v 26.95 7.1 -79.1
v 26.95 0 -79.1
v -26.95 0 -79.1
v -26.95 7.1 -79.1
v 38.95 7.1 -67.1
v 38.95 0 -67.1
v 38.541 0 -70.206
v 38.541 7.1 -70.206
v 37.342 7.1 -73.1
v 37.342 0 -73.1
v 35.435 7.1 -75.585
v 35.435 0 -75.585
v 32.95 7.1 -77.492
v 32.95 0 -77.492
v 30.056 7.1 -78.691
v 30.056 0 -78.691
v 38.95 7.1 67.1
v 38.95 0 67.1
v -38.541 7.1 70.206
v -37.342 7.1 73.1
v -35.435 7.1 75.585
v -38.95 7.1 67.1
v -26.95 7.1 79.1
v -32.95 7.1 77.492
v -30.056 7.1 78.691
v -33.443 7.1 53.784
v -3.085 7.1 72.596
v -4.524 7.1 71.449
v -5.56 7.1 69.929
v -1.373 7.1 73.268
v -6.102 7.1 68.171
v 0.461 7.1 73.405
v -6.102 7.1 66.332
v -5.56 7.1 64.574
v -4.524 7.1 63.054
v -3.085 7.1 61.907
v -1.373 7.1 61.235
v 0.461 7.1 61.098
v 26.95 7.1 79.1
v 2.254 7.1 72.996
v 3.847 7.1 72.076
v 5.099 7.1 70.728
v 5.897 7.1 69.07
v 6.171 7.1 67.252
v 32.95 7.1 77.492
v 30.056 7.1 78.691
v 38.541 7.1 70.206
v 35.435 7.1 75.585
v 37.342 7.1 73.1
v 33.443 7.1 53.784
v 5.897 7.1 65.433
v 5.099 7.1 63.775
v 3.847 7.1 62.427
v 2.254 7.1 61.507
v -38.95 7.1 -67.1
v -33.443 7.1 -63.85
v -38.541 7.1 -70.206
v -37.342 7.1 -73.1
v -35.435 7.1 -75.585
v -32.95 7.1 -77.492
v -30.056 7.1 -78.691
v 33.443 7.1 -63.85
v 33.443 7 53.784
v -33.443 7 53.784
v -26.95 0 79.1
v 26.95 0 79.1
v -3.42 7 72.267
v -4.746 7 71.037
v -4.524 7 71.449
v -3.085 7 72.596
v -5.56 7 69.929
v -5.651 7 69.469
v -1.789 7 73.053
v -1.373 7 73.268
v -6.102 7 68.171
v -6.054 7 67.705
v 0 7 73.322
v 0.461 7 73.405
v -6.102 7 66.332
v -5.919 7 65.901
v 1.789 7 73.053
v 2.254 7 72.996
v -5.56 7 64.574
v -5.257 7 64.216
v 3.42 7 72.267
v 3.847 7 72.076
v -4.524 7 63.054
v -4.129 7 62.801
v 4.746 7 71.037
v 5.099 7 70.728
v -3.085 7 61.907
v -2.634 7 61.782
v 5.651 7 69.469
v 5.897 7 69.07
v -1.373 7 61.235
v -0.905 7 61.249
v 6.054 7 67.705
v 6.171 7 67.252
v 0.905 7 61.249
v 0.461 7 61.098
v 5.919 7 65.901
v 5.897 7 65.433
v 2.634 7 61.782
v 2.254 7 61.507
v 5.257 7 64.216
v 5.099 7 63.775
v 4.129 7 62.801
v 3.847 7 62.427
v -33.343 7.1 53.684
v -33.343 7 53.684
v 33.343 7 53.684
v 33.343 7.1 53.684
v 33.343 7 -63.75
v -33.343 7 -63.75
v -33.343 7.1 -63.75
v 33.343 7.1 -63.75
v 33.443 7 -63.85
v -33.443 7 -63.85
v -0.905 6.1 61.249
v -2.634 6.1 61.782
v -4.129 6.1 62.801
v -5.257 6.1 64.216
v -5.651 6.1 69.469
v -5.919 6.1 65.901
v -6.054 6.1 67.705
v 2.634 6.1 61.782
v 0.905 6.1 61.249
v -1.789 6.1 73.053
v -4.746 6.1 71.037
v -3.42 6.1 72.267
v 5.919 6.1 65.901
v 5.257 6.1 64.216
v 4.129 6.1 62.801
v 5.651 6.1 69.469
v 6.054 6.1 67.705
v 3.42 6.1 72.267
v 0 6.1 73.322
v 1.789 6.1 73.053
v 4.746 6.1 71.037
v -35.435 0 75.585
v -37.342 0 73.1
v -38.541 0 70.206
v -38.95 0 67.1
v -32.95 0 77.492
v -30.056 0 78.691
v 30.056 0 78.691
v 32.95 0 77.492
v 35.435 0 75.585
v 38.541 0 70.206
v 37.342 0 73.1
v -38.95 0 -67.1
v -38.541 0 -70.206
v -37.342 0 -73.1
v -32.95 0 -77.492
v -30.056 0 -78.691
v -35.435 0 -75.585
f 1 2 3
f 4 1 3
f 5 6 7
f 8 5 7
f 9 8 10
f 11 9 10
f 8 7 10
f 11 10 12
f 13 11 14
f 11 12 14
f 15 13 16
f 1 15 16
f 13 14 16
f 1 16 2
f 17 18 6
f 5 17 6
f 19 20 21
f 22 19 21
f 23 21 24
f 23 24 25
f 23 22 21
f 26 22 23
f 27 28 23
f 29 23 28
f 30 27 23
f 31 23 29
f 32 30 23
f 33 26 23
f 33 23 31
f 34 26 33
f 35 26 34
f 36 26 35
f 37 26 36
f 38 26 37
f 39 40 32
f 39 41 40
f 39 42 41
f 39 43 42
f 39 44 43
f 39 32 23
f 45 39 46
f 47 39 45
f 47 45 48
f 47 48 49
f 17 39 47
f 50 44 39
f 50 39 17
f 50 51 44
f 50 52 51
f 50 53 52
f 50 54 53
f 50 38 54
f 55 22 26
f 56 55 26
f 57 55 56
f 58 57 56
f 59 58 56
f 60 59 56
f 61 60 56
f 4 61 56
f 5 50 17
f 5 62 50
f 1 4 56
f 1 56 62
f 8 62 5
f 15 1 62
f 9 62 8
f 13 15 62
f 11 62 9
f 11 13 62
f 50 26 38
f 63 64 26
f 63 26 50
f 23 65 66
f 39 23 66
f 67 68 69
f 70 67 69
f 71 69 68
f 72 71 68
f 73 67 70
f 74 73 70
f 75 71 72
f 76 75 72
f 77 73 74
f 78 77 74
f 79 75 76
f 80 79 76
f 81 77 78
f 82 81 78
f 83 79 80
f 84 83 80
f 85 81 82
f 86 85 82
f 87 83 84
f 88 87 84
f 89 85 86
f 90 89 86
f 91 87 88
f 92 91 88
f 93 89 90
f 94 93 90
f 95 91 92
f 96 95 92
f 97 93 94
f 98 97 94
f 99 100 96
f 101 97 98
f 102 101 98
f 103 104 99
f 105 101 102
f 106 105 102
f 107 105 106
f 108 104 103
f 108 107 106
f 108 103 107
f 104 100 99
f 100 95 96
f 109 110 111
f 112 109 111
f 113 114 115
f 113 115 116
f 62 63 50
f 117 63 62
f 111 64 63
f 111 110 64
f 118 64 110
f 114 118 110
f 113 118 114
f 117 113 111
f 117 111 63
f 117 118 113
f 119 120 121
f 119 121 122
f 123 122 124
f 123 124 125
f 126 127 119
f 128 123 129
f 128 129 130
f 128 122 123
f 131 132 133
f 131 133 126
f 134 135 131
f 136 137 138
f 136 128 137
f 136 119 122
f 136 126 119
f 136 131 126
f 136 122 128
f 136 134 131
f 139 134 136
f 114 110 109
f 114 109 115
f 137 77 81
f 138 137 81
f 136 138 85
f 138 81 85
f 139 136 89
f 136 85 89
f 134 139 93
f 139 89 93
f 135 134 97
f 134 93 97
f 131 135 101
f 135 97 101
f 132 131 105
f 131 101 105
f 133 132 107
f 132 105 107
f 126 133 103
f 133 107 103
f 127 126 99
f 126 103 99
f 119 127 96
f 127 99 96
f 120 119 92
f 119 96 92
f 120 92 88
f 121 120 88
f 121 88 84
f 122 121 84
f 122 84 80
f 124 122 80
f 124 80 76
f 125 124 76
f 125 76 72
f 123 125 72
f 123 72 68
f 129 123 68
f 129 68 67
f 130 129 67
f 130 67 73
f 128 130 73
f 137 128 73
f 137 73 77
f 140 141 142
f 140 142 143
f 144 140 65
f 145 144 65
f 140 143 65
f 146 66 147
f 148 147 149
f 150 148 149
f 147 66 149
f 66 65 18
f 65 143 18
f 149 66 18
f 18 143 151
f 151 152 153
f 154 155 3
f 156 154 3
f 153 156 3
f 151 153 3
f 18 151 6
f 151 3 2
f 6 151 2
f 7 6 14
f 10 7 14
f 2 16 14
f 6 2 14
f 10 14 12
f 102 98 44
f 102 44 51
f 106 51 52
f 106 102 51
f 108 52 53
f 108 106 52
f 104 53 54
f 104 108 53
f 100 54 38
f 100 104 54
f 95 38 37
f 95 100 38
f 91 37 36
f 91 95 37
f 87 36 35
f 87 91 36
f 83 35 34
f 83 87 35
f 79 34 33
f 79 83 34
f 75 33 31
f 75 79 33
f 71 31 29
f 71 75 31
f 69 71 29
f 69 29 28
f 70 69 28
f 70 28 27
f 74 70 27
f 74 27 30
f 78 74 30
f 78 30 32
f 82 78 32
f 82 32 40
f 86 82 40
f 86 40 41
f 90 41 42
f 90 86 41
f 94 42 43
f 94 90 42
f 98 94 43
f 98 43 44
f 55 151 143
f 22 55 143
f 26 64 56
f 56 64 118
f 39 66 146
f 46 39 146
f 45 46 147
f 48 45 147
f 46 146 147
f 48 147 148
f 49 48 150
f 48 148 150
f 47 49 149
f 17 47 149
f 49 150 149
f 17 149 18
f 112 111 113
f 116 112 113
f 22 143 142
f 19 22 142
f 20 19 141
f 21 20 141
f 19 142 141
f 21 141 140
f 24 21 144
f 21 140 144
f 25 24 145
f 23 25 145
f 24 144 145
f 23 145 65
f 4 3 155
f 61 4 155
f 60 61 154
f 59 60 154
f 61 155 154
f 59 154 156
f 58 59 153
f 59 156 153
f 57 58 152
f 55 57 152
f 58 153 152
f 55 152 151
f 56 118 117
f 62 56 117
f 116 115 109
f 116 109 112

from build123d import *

# Parameters (mm, degrees)
EXTRUDE_1_DEPTH       = 7.1
SKETCH_2_R            = 6.07081667
CUT_EXTRUDE_1_DEPTH   = 1
SKETCH_2_4_R          = 6.17081667
SKETCH_2_4_R_2        = 6.07081667
SKETCH_2_4_W          = 66.885632048
SKETCH_2_4_H          = 117.633817445
SKETCH_2_4_W_2        = 66.685632048
SKETCH_2_4_H_2        = 117.433817445
CUT_EXTRUDE_1_2_DEPTH = 0.1


with BuildPart() as part:
    # Эскиз1 → Бобышка-Вытянуть1 (new body)
    with BuildSketch(Plane(origin=(0, 0, 0), x_dir=(1, 0, 0), z_dir=(0, 1, 0))):
        with BuildLine():
            Line((26.95, 79.1), (-26.95, 79.1))
            ThreePointArc((-26.95, 79.1), (-35.435281374, 75.585281374), (-38.95, 67.1))
            Line((-38.95, 67.1), (-38.95, -67.1))
            ThreePointArc((-38.95, -67.1), (-35.435281374, -75.585281374), (-26.95, -79.1))
            Line((-26.95, -79.1), (26.95, -79.1))
            ThreePointArc((26.95, -79.1), (35.435281374, -75.585281374), (38.95, -67.1))
            Line((38.95, -67.1), (38.95, 67.1))
            ThreePointArc((38.95, 67.1), (35.435281374, 75.585281374), (26.95, 79.1))
        make_face()
    extrude(amount=EXTRUDE_1_DEPTH)

    # Эскиз2 → Cut-Extrude 1 (cut)
    with BuildSketch(Plane(origin=(0, 7.1, 0), x_dir=(1, 0, 0), z_dir=(0, 1, 0))):
        with Locations((0, -67.251539846)):
            Circle(SKETCH_2_R)
    extrude(amount=-CUT_EXTRUDE_1_DEPTH, mode=Mode.SUBTRACT)

    # Эскиз2<4> → Cut-Extrude 1 2 (cut)
    # profile 1 of 2: a face of its own
    with BuildSketch(Plane(origin=(0, 7.1, 0), x_dir=(1, 0, 0), z_dir=(0, 1, 0))):
        with Locations((0, -67.251539846)):
            Circle(SKETCH_2_4_R)
        with Locations((0, -67.251539846)):
            Circle(SKETCH_2_4_R_2, mode=Mode.SUBTRACT)
    # profile 2 of 2: a face of its own
    with BuildSketch(Plane(origin=(0, 7.1, 0), x_dir=(1, 0, 0), z_dir=(0, 1, 0))):
        with Locations((0, 5.032877891)):
            Rectangle(SKETCH_2_4_W, SKETCH_2_4_H)
        with Locations((0, 5.032877891)):
            Rectangle(SKETCH_2_4_W_2, SKETCH_2_4_H_2, mode=Mode.SUBTRACT)
    extrude(amount=-CUT_EXTRUDE_1_2_DEPTH, mode=Mode.SUBTRACT)


solid = part.part
